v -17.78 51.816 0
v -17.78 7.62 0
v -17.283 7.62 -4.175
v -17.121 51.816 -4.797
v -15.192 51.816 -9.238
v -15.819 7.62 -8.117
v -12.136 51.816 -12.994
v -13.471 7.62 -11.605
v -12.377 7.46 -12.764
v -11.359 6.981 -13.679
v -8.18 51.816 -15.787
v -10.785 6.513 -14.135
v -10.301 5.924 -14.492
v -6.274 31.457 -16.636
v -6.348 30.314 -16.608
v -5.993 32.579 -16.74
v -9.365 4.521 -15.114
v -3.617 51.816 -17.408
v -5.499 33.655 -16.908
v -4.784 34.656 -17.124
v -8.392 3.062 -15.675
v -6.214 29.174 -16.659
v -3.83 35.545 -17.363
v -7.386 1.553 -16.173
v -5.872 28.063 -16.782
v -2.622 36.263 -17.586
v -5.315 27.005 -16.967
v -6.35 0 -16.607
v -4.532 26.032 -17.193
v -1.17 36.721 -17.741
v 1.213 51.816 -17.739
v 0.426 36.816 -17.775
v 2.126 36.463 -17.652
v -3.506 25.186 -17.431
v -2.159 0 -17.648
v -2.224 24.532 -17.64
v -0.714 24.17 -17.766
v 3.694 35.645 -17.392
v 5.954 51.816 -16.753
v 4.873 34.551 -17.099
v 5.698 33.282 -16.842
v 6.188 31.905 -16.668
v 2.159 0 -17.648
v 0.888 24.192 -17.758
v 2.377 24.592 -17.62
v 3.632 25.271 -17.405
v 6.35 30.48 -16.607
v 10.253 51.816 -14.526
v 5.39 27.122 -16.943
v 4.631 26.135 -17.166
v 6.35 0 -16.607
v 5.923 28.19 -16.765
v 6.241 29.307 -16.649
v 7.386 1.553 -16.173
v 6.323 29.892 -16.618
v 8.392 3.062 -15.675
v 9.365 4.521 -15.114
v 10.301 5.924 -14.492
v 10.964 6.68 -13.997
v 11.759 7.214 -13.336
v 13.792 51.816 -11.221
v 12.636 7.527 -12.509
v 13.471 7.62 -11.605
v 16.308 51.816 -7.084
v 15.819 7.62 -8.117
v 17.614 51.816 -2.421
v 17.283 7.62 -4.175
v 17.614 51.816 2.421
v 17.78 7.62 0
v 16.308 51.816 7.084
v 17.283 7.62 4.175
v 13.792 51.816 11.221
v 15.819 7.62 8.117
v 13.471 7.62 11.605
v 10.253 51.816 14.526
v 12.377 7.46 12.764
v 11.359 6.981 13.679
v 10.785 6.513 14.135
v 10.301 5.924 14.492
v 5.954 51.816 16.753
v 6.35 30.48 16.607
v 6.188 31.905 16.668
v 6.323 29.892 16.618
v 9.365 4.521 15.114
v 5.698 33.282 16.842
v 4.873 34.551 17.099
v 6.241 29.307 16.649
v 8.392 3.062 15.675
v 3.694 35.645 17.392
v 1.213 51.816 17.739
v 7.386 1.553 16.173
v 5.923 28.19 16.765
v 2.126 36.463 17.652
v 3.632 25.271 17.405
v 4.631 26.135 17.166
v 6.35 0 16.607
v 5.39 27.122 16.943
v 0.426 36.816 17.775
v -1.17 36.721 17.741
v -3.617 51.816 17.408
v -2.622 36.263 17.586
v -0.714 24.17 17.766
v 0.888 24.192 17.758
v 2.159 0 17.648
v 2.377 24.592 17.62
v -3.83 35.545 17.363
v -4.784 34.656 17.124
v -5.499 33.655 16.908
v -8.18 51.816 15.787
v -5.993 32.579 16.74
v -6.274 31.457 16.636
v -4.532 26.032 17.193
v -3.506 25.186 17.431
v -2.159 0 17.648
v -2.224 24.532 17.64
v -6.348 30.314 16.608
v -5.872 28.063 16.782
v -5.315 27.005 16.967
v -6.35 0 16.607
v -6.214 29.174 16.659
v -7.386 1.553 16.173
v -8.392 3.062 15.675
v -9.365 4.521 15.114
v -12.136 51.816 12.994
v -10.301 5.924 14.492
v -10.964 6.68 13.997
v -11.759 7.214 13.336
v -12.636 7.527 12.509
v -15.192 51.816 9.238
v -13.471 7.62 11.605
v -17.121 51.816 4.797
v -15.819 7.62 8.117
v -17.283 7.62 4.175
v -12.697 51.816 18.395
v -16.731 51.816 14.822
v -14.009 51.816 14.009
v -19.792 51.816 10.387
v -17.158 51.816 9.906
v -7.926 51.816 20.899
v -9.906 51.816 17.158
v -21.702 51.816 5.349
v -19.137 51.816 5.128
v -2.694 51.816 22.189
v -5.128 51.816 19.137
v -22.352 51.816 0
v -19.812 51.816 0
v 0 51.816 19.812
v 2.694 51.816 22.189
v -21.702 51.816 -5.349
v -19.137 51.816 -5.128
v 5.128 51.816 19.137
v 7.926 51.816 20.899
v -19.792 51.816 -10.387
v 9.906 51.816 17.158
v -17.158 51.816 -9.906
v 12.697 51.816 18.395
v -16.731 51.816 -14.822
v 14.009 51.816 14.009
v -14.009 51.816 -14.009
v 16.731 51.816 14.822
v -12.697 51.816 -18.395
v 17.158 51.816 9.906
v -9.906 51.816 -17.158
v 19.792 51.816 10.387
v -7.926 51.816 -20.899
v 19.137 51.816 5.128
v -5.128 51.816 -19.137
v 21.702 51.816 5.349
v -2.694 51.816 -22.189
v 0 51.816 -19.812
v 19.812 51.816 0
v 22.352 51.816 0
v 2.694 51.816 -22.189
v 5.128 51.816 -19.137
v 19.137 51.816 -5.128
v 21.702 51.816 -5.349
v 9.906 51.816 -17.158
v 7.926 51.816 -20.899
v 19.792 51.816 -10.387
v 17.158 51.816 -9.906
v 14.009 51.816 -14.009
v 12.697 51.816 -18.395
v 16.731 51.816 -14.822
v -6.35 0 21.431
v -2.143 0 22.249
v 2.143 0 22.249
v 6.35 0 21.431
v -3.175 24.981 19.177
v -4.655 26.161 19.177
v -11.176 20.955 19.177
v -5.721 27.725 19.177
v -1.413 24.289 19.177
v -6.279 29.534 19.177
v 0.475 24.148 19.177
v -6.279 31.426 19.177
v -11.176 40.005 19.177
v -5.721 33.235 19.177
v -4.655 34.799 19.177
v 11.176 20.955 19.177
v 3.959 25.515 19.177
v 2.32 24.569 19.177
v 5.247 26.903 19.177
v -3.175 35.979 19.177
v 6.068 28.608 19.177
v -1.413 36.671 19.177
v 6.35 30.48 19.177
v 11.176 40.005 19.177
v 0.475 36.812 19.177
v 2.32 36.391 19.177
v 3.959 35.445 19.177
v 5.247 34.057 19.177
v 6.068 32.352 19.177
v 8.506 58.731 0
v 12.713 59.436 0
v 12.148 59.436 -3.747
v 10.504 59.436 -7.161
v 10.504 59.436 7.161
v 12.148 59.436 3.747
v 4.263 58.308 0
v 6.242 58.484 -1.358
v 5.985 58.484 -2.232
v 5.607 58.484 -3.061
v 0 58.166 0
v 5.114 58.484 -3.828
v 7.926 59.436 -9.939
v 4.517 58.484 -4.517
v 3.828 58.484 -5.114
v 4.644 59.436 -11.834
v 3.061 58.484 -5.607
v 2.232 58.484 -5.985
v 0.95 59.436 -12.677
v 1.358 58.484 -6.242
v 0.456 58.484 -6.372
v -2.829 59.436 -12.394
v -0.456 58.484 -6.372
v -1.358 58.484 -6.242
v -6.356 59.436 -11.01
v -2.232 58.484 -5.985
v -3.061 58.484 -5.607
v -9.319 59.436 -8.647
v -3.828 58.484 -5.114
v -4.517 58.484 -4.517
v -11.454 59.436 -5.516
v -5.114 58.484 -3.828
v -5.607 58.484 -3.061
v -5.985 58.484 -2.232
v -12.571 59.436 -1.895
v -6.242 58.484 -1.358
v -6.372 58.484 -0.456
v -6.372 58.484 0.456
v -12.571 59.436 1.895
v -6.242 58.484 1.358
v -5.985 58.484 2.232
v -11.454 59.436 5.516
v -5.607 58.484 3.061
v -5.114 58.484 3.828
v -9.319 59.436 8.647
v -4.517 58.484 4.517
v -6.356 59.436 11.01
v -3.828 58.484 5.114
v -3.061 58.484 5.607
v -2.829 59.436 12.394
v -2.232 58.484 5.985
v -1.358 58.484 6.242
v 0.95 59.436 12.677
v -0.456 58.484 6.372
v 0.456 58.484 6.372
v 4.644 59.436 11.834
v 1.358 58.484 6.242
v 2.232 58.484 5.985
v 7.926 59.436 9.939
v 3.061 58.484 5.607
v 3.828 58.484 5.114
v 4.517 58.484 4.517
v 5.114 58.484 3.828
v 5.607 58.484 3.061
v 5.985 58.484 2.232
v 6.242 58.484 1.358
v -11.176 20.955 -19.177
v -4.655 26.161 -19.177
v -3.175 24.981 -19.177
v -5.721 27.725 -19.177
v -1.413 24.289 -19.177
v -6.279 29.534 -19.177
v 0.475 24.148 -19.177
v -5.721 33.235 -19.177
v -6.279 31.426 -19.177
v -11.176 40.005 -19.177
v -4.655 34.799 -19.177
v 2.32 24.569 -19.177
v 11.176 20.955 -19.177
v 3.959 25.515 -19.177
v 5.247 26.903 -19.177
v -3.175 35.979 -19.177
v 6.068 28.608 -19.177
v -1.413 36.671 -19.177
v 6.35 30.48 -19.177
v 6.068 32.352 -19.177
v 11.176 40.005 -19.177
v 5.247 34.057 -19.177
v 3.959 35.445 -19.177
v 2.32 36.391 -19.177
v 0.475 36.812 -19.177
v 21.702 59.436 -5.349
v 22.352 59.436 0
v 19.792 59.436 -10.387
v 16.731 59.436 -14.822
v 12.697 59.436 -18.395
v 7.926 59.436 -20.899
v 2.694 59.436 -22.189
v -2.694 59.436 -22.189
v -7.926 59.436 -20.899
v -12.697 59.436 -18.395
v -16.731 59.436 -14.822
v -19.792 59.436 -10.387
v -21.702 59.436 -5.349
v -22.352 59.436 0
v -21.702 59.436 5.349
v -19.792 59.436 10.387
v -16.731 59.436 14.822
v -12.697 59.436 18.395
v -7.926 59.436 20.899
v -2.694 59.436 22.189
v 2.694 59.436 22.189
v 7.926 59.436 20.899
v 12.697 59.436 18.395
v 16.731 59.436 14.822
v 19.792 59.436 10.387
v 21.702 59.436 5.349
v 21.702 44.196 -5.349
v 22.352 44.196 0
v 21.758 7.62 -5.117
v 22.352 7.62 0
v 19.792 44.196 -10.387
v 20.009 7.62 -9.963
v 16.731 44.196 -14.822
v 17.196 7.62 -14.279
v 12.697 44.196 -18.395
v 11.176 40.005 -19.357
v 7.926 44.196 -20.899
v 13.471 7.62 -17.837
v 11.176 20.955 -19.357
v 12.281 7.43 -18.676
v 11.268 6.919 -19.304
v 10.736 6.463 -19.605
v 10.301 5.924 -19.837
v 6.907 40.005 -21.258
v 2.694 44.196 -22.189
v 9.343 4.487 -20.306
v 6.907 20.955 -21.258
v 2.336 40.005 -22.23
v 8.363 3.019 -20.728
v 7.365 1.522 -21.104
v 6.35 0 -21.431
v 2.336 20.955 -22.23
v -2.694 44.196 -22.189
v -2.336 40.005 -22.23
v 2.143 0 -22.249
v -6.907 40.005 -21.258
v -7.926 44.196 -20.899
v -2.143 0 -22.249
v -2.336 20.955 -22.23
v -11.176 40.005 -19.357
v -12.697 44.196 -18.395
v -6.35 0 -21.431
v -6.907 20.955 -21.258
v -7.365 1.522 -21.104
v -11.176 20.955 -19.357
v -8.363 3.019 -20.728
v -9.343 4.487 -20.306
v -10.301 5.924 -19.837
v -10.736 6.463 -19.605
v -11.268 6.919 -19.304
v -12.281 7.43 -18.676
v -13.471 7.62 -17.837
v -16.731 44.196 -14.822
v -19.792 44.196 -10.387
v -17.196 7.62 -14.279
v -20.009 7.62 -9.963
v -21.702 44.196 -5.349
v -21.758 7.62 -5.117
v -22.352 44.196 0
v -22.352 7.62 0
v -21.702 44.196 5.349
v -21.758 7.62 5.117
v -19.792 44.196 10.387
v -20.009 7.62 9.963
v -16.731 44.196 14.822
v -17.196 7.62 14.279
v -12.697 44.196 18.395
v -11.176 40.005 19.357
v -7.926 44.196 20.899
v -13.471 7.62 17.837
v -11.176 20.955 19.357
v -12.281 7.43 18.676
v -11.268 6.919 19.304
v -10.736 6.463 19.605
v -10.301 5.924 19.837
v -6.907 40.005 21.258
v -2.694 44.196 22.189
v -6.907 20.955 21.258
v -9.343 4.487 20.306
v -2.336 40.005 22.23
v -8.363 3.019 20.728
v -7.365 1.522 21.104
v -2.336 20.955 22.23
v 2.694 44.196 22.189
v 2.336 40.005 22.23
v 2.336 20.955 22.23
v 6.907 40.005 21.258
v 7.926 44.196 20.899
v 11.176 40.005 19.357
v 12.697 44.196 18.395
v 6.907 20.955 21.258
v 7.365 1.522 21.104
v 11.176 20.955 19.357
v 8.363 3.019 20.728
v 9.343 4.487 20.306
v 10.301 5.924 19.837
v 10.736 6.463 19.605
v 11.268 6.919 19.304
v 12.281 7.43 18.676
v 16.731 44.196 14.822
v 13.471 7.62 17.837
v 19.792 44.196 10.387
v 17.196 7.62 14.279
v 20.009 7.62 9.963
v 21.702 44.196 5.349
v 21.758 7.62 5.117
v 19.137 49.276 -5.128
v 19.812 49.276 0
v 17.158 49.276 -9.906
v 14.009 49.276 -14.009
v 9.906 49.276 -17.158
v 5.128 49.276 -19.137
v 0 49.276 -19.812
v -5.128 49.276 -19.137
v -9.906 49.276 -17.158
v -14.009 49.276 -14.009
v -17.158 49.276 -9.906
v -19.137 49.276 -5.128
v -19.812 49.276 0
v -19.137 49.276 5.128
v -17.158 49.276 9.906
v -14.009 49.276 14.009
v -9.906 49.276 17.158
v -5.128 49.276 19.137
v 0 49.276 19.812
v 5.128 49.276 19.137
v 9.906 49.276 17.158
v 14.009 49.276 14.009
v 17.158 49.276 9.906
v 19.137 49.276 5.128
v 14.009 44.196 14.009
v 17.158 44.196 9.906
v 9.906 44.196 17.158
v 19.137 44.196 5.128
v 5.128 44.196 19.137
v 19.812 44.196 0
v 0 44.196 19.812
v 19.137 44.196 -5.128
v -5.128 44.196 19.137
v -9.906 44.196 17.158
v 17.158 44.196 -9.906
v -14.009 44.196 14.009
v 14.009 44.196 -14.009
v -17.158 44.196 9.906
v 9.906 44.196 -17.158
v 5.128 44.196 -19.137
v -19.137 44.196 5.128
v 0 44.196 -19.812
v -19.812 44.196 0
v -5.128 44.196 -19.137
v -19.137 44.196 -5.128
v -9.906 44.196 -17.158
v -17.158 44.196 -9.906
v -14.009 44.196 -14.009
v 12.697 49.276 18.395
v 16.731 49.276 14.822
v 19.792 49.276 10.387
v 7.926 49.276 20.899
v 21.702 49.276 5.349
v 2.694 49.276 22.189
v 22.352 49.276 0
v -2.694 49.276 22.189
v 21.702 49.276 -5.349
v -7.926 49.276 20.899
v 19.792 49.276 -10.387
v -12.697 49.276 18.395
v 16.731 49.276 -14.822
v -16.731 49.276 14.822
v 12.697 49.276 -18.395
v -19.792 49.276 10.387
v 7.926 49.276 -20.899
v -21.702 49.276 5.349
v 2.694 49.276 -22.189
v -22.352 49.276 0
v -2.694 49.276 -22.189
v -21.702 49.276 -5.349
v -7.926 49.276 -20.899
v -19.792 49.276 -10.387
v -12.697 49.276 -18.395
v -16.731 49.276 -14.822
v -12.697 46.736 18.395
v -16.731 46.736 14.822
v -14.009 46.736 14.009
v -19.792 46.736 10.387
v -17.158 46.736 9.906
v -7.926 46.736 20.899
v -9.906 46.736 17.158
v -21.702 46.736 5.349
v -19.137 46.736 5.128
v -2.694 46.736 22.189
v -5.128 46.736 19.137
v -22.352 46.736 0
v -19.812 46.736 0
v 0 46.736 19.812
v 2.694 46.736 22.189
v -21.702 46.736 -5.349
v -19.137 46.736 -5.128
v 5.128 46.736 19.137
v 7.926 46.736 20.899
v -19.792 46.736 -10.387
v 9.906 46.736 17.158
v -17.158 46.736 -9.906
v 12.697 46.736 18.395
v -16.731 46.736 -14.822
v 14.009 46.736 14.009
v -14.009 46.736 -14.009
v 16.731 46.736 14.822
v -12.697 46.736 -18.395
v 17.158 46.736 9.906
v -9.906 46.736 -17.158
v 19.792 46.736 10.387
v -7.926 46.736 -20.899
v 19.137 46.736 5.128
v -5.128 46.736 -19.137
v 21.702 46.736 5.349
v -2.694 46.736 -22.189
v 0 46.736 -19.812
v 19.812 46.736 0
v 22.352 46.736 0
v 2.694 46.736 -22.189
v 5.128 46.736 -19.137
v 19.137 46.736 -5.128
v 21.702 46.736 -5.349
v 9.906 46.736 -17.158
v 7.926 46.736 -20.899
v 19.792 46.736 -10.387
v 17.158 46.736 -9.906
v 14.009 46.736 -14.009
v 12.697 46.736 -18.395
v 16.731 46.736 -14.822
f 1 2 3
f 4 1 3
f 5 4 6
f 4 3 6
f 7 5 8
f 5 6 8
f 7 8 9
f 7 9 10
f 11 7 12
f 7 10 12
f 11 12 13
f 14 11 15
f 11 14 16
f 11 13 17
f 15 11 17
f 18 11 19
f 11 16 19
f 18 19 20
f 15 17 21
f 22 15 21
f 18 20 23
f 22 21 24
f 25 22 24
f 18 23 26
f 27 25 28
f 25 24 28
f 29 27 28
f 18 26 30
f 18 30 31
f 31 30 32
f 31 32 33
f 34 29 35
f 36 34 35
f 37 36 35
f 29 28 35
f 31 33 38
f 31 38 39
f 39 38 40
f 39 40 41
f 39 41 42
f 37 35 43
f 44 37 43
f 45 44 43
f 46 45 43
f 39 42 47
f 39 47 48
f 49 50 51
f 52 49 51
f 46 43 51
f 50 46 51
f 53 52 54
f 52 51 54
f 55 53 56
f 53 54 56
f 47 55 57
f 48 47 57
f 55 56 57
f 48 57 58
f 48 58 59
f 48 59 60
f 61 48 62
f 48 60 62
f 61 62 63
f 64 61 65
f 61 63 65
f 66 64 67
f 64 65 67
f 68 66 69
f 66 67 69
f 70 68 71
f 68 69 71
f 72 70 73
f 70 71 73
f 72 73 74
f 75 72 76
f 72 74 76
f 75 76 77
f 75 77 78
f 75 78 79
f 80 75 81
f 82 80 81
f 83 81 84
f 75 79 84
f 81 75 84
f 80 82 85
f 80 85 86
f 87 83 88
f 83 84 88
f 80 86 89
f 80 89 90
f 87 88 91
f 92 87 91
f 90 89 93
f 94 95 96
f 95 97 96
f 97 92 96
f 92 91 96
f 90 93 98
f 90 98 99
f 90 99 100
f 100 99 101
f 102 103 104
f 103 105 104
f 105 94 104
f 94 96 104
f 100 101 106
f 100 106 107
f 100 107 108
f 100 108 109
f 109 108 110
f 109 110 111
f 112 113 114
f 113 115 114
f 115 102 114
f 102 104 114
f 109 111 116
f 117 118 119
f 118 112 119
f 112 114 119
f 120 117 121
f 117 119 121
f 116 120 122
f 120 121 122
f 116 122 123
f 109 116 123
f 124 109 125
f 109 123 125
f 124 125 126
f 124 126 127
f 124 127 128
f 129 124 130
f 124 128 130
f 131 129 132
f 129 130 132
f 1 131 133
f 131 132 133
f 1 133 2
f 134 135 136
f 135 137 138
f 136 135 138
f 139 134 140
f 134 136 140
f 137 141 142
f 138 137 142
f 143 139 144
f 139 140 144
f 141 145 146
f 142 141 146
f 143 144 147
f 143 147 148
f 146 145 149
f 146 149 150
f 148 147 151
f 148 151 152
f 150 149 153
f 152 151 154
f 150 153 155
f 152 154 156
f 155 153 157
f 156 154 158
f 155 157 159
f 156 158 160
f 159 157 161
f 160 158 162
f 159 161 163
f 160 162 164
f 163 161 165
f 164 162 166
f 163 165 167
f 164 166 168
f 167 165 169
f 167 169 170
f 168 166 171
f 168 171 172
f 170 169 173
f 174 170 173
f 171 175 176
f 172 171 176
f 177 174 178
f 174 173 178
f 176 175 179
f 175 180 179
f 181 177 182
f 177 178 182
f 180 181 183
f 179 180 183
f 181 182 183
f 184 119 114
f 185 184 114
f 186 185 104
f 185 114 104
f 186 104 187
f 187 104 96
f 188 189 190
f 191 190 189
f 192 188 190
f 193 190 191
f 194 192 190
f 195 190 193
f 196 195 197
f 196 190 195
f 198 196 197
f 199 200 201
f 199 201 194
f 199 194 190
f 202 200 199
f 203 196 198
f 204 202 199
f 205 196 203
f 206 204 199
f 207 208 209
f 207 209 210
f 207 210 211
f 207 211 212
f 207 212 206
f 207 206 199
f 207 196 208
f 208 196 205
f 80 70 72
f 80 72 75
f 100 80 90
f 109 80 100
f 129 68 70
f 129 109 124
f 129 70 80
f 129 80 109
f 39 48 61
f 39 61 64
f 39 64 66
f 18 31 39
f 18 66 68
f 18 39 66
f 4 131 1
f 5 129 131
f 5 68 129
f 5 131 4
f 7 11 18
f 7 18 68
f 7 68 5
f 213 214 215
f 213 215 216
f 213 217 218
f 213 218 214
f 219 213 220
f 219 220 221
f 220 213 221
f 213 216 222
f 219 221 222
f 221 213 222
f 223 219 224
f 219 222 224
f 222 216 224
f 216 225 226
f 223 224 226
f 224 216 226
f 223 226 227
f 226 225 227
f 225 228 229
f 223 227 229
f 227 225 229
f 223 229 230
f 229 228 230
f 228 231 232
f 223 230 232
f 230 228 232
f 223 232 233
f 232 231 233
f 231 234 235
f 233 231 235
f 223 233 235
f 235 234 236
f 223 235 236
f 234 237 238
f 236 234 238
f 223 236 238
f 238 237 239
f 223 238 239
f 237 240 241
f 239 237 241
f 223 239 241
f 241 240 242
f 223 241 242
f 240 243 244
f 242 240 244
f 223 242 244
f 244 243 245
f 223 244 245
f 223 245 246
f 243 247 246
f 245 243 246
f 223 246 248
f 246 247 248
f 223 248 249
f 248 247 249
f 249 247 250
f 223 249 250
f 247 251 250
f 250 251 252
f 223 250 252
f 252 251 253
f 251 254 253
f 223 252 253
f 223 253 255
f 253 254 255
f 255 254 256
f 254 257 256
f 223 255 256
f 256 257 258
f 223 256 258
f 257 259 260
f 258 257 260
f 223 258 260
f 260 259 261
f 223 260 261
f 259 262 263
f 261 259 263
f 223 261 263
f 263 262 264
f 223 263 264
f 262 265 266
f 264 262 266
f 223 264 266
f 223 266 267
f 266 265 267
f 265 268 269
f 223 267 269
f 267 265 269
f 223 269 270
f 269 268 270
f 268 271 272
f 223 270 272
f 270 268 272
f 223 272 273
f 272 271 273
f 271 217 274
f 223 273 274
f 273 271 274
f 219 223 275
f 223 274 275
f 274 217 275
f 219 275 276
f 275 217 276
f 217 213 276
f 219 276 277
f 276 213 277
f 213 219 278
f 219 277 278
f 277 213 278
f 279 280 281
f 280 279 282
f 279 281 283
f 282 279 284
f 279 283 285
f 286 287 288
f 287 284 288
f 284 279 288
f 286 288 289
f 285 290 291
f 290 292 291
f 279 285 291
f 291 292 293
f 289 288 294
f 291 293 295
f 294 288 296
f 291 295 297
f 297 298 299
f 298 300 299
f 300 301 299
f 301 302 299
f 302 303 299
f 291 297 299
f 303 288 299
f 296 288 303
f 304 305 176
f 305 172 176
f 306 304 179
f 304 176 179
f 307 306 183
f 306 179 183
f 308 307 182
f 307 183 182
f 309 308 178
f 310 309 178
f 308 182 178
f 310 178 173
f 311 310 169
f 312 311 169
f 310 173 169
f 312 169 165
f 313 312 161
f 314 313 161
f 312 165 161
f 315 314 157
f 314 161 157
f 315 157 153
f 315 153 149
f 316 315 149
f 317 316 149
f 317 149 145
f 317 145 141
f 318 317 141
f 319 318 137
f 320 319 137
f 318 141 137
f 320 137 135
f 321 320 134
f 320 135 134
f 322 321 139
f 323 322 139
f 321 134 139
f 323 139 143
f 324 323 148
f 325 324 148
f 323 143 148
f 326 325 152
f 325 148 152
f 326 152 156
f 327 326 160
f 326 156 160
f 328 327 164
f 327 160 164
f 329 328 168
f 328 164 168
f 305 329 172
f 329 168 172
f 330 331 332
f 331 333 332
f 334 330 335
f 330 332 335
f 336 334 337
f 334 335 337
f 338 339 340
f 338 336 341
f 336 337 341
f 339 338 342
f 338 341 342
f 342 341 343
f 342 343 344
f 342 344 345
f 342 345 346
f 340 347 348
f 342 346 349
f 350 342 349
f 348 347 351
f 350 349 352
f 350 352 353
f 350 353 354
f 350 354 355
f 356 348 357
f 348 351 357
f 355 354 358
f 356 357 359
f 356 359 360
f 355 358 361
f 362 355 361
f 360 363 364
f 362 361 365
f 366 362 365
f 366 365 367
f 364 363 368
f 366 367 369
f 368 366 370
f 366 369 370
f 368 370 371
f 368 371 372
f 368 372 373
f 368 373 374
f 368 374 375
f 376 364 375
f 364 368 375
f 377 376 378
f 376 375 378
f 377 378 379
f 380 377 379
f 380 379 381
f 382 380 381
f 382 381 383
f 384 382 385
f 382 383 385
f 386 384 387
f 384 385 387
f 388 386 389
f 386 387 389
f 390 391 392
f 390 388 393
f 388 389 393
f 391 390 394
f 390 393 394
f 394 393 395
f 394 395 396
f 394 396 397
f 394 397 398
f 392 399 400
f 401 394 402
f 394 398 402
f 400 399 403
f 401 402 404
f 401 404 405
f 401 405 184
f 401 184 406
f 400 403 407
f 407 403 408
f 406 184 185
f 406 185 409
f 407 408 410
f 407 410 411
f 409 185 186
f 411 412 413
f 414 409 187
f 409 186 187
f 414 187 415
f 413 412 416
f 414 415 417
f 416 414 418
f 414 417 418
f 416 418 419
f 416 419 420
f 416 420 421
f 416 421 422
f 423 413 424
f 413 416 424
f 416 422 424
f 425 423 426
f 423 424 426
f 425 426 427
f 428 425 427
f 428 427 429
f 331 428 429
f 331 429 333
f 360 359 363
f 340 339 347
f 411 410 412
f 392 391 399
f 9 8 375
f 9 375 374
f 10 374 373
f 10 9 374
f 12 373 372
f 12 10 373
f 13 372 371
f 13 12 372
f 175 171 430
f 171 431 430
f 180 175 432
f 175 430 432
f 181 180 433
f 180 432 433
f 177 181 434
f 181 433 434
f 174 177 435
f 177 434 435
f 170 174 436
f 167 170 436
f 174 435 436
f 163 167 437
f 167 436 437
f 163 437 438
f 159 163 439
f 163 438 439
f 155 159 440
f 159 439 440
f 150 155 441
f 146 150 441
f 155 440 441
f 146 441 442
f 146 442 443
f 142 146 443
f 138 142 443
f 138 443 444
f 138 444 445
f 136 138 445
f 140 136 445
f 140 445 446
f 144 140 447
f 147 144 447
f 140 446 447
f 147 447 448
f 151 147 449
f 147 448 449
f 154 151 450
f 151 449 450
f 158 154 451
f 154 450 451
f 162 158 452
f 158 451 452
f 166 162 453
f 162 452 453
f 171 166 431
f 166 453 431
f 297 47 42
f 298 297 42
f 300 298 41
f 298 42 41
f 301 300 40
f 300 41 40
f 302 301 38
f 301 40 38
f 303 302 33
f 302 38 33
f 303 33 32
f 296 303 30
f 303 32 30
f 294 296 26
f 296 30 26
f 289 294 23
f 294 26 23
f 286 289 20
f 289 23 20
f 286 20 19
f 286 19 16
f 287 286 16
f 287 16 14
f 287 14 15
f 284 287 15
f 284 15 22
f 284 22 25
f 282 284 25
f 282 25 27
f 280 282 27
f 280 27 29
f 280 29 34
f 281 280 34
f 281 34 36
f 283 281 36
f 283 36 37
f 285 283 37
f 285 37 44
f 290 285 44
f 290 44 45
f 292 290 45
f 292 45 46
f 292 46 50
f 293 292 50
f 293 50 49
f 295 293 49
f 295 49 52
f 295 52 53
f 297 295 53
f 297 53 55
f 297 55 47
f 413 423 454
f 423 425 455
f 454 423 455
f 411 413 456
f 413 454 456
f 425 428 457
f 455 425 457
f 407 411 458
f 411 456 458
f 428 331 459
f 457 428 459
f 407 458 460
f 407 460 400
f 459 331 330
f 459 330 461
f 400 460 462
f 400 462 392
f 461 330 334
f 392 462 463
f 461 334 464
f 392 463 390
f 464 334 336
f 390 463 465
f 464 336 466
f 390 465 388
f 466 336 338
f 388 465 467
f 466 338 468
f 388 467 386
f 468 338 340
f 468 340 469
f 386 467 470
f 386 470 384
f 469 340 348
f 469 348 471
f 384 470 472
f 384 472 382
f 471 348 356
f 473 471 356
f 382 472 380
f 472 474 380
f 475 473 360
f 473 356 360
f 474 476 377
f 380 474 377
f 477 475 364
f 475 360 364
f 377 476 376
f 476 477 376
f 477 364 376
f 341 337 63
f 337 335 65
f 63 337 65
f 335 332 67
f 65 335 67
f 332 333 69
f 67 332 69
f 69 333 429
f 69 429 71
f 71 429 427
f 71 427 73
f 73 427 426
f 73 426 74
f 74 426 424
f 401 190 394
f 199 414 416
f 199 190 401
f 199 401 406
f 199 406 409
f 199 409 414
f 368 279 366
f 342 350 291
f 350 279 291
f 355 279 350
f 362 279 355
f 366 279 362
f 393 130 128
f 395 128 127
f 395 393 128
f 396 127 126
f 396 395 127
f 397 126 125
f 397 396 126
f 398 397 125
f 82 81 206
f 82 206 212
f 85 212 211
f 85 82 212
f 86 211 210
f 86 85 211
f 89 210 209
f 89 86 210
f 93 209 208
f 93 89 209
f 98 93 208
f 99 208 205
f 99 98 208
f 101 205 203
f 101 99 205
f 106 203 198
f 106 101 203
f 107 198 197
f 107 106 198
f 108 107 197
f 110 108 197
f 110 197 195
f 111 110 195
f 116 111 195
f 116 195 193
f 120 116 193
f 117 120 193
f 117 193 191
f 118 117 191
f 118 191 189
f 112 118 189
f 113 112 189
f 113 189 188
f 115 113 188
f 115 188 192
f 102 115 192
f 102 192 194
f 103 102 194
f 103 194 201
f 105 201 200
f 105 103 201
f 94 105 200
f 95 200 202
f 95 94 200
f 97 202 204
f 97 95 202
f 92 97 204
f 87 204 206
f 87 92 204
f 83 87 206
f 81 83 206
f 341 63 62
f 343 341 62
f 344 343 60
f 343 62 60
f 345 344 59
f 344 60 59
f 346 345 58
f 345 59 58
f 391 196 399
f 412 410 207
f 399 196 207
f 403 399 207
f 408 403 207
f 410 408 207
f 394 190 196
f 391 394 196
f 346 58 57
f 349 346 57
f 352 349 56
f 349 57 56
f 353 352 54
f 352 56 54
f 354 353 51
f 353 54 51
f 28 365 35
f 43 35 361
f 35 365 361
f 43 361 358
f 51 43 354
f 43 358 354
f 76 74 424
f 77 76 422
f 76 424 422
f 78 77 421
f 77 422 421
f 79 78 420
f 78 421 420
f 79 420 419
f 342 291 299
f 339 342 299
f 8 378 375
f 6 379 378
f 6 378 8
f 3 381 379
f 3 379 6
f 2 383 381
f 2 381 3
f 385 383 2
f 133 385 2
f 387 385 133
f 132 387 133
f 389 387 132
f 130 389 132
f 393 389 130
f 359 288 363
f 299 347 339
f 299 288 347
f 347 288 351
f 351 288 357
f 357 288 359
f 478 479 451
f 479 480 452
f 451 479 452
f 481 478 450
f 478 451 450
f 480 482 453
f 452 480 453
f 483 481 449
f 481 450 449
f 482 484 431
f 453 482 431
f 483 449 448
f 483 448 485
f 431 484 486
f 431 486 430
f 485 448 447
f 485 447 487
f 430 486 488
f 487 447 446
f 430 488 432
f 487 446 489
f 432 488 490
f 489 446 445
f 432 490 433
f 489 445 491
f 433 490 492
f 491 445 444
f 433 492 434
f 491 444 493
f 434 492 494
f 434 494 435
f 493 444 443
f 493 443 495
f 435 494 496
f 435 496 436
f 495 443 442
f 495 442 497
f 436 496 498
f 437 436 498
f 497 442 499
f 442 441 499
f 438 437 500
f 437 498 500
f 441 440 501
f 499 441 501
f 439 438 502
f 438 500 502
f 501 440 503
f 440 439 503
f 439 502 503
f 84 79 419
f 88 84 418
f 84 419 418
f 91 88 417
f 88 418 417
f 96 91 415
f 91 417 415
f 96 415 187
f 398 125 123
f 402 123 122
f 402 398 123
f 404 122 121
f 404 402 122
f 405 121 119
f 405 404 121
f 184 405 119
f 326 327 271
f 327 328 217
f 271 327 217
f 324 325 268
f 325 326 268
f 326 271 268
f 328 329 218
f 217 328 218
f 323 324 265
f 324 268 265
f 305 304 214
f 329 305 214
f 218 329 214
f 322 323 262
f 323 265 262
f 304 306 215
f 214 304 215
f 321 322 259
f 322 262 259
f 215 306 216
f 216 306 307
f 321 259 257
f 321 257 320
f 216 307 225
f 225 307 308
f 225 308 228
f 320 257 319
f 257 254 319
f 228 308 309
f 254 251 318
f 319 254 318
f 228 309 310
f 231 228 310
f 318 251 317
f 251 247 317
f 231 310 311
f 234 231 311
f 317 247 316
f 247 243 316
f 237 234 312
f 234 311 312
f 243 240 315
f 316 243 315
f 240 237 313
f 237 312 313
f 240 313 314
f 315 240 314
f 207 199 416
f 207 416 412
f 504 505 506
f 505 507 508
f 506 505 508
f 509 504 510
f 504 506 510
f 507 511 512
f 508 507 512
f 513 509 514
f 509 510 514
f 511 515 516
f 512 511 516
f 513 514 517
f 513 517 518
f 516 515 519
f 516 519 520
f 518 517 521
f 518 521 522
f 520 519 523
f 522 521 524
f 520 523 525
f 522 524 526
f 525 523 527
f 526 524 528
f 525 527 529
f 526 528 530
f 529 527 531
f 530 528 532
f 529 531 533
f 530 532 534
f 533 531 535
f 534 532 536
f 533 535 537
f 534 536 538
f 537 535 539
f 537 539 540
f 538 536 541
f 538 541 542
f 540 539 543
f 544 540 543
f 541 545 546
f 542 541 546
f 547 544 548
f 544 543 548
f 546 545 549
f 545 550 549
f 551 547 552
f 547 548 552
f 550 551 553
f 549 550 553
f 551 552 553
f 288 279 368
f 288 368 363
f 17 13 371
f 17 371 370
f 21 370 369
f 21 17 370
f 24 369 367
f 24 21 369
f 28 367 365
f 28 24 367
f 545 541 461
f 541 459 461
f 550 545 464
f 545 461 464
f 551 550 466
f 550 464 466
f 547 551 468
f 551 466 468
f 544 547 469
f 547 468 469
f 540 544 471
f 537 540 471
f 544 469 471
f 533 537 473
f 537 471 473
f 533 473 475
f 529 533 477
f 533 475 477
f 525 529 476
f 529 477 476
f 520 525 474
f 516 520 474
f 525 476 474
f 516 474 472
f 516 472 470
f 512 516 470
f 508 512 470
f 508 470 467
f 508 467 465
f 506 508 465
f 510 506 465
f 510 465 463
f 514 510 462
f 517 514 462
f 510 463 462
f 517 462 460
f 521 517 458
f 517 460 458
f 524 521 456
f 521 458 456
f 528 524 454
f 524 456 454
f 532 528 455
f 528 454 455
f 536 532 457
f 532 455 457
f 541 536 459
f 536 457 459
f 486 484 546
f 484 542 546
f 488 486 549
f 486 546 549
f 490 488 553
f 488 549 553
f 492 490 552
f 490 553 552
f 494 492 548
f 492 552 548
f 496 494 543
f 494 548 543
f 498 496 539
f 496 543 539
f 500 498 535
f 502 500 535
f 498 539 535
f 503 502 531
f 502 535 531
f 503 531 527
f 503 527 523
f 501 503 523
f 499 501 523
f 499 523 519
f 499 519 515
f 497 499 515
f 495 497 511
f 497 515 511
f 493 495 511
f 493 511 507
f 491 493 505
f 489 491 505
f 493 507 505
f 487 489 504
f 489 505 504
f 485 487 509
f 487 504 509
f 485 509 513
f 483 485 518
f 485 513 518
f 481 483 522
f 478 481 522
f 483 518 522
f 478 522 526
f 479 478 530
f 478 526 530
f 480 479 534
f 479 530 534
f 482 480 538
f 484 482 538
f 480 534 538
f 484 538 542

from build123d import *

# Parameters (mm, degrees)
SKETCH3_R               = 17.78
CUT_EXTRUDE2_DEPTH      = 51.816
SKETCH4_R               = 6.35
CUT_EXTRUDE3_DEPTH      = 23.352
CUT_EXTRUDE3_DEPTH_BACK = 23.352
CUT_EXTRUDE5_START      = 19.177
SKETCH5_W               = 22.352
SKETCH5_H               = 19.05
CUT_EXTRUDE5_DEPTH      = 4.1750001
CUT_EXTRUDE6_DEPTH      = 23.352


with BuildPart() as part:
    # Sketch1 → Revolve2 (revolve)
    with BuildSketch(Plane.XY):
        with BuildLine():
            Line((0, 0), (0, 58.166))
            ThreePointArc((0, 58.166), (6.387986381, 58.484288237), (12.712693656, 59.436))
            Line((12.712693656, 59.436), (22.352, 59.436))
            Line((22.352, 59.436), (22.352, 51.816))
            Line((22.352, 51.816), (19.812, 51.816))
            Line((19.812, 51.816), (19.812, 49.276))
            Line((19.812, 49.276), (22.352, 49.276))
            Line((22.352, 49.276), (22.352, 46.736))
            Line((22.352, 46.736), (19.812, 46.736))
            Line((19.812, 46.736), (19.812, 44.196))
            Line((19.812, 44.196), (22.352, 44.196))
            Line((22.352, 44.196), (22.352, 0))
            Line((22.352, 0), (0, 0))
        make_face()
    revolve(axis=Axis((0, 0, 0), (0, 1, 0)))

    # Sketch3 → Cut-Extrude2 (cut)
    with BuildSketch(Plane(origin=(0, 0, 0), x_dir=(-1, 0, 0), z_dir=(0, -1, 0))):
        Circle(SKETCH3_R)
    extrude(amount=-CUT_EXTRUDE2_DEPTH, mode=Mode.SUBTRACT)

    # Sketch4 → Cut-Extrude3 (cut, two sides)
    with BuildSketch(Plane.XY) as cut_extrude3_sk:
        with Locations((0, 30.48)):
            Circle(SKETCH4_R)
    extrude(amount=CUT_EXTRUDE3_DEPTH, mode=Mode.SUBTRACT)
    extrude(cut_extrude3_sk.sketch, amount=-CUT_EXTRUDE3_DEPTH_BACK, mode=Mode.SUBTRACT)

    # Sketch5 → Cut-Extrude5 (cut, through all)
    with BuildSketch(Plane.XY.offset(CUT_EXTRUDE5_START)):
        with Locations((0, 30.48)):
            Rectangle(SKETCH5_W, SKETCH5_H)
    cut_extrude5 = extrude(amount=CUT_EXTRUDE5_DEPTH, mode=Mode.SUBTRACT)

    # Mirror1: Cut-Extrude5 across plane
    add(cut_extrude5.mirror(Plane.XY), mode=Mode.SUBTRACT)

    # Sketch6 → Cut-Extrude6 (cut, symmetric)
    with BuildSketch(Plane.XY):
        with BuildLine():
            Line((22.352, 7.62), (13.470533586, 7.62))
            ThreePointArc((13.470533586, 7.62), (11.673046061, 7.169336035), (10.300788381, 5.923957269))
            Line((10.300788381, 5.923957269), (6.35, 0))
            Line((6.35, 0), (22.352, 0))
            Line((22.352, 0), (22.352, 7.62))
        make_face()
    cut_extrude6 = extrude(amount=CUT_EXTRUDE6_DEPTH, both=True, mode=Mode.SUBTRACT)

    # Mirror2: Cut-Extrude6 across plane
    add(cut_extrude6.mirror(Plane(origin=(0, 0, 0), x_dir=(0, 0, 1), z_dir=(1, 0, 0))), mode=Mode.SUBTRACT)


solid = part.part
